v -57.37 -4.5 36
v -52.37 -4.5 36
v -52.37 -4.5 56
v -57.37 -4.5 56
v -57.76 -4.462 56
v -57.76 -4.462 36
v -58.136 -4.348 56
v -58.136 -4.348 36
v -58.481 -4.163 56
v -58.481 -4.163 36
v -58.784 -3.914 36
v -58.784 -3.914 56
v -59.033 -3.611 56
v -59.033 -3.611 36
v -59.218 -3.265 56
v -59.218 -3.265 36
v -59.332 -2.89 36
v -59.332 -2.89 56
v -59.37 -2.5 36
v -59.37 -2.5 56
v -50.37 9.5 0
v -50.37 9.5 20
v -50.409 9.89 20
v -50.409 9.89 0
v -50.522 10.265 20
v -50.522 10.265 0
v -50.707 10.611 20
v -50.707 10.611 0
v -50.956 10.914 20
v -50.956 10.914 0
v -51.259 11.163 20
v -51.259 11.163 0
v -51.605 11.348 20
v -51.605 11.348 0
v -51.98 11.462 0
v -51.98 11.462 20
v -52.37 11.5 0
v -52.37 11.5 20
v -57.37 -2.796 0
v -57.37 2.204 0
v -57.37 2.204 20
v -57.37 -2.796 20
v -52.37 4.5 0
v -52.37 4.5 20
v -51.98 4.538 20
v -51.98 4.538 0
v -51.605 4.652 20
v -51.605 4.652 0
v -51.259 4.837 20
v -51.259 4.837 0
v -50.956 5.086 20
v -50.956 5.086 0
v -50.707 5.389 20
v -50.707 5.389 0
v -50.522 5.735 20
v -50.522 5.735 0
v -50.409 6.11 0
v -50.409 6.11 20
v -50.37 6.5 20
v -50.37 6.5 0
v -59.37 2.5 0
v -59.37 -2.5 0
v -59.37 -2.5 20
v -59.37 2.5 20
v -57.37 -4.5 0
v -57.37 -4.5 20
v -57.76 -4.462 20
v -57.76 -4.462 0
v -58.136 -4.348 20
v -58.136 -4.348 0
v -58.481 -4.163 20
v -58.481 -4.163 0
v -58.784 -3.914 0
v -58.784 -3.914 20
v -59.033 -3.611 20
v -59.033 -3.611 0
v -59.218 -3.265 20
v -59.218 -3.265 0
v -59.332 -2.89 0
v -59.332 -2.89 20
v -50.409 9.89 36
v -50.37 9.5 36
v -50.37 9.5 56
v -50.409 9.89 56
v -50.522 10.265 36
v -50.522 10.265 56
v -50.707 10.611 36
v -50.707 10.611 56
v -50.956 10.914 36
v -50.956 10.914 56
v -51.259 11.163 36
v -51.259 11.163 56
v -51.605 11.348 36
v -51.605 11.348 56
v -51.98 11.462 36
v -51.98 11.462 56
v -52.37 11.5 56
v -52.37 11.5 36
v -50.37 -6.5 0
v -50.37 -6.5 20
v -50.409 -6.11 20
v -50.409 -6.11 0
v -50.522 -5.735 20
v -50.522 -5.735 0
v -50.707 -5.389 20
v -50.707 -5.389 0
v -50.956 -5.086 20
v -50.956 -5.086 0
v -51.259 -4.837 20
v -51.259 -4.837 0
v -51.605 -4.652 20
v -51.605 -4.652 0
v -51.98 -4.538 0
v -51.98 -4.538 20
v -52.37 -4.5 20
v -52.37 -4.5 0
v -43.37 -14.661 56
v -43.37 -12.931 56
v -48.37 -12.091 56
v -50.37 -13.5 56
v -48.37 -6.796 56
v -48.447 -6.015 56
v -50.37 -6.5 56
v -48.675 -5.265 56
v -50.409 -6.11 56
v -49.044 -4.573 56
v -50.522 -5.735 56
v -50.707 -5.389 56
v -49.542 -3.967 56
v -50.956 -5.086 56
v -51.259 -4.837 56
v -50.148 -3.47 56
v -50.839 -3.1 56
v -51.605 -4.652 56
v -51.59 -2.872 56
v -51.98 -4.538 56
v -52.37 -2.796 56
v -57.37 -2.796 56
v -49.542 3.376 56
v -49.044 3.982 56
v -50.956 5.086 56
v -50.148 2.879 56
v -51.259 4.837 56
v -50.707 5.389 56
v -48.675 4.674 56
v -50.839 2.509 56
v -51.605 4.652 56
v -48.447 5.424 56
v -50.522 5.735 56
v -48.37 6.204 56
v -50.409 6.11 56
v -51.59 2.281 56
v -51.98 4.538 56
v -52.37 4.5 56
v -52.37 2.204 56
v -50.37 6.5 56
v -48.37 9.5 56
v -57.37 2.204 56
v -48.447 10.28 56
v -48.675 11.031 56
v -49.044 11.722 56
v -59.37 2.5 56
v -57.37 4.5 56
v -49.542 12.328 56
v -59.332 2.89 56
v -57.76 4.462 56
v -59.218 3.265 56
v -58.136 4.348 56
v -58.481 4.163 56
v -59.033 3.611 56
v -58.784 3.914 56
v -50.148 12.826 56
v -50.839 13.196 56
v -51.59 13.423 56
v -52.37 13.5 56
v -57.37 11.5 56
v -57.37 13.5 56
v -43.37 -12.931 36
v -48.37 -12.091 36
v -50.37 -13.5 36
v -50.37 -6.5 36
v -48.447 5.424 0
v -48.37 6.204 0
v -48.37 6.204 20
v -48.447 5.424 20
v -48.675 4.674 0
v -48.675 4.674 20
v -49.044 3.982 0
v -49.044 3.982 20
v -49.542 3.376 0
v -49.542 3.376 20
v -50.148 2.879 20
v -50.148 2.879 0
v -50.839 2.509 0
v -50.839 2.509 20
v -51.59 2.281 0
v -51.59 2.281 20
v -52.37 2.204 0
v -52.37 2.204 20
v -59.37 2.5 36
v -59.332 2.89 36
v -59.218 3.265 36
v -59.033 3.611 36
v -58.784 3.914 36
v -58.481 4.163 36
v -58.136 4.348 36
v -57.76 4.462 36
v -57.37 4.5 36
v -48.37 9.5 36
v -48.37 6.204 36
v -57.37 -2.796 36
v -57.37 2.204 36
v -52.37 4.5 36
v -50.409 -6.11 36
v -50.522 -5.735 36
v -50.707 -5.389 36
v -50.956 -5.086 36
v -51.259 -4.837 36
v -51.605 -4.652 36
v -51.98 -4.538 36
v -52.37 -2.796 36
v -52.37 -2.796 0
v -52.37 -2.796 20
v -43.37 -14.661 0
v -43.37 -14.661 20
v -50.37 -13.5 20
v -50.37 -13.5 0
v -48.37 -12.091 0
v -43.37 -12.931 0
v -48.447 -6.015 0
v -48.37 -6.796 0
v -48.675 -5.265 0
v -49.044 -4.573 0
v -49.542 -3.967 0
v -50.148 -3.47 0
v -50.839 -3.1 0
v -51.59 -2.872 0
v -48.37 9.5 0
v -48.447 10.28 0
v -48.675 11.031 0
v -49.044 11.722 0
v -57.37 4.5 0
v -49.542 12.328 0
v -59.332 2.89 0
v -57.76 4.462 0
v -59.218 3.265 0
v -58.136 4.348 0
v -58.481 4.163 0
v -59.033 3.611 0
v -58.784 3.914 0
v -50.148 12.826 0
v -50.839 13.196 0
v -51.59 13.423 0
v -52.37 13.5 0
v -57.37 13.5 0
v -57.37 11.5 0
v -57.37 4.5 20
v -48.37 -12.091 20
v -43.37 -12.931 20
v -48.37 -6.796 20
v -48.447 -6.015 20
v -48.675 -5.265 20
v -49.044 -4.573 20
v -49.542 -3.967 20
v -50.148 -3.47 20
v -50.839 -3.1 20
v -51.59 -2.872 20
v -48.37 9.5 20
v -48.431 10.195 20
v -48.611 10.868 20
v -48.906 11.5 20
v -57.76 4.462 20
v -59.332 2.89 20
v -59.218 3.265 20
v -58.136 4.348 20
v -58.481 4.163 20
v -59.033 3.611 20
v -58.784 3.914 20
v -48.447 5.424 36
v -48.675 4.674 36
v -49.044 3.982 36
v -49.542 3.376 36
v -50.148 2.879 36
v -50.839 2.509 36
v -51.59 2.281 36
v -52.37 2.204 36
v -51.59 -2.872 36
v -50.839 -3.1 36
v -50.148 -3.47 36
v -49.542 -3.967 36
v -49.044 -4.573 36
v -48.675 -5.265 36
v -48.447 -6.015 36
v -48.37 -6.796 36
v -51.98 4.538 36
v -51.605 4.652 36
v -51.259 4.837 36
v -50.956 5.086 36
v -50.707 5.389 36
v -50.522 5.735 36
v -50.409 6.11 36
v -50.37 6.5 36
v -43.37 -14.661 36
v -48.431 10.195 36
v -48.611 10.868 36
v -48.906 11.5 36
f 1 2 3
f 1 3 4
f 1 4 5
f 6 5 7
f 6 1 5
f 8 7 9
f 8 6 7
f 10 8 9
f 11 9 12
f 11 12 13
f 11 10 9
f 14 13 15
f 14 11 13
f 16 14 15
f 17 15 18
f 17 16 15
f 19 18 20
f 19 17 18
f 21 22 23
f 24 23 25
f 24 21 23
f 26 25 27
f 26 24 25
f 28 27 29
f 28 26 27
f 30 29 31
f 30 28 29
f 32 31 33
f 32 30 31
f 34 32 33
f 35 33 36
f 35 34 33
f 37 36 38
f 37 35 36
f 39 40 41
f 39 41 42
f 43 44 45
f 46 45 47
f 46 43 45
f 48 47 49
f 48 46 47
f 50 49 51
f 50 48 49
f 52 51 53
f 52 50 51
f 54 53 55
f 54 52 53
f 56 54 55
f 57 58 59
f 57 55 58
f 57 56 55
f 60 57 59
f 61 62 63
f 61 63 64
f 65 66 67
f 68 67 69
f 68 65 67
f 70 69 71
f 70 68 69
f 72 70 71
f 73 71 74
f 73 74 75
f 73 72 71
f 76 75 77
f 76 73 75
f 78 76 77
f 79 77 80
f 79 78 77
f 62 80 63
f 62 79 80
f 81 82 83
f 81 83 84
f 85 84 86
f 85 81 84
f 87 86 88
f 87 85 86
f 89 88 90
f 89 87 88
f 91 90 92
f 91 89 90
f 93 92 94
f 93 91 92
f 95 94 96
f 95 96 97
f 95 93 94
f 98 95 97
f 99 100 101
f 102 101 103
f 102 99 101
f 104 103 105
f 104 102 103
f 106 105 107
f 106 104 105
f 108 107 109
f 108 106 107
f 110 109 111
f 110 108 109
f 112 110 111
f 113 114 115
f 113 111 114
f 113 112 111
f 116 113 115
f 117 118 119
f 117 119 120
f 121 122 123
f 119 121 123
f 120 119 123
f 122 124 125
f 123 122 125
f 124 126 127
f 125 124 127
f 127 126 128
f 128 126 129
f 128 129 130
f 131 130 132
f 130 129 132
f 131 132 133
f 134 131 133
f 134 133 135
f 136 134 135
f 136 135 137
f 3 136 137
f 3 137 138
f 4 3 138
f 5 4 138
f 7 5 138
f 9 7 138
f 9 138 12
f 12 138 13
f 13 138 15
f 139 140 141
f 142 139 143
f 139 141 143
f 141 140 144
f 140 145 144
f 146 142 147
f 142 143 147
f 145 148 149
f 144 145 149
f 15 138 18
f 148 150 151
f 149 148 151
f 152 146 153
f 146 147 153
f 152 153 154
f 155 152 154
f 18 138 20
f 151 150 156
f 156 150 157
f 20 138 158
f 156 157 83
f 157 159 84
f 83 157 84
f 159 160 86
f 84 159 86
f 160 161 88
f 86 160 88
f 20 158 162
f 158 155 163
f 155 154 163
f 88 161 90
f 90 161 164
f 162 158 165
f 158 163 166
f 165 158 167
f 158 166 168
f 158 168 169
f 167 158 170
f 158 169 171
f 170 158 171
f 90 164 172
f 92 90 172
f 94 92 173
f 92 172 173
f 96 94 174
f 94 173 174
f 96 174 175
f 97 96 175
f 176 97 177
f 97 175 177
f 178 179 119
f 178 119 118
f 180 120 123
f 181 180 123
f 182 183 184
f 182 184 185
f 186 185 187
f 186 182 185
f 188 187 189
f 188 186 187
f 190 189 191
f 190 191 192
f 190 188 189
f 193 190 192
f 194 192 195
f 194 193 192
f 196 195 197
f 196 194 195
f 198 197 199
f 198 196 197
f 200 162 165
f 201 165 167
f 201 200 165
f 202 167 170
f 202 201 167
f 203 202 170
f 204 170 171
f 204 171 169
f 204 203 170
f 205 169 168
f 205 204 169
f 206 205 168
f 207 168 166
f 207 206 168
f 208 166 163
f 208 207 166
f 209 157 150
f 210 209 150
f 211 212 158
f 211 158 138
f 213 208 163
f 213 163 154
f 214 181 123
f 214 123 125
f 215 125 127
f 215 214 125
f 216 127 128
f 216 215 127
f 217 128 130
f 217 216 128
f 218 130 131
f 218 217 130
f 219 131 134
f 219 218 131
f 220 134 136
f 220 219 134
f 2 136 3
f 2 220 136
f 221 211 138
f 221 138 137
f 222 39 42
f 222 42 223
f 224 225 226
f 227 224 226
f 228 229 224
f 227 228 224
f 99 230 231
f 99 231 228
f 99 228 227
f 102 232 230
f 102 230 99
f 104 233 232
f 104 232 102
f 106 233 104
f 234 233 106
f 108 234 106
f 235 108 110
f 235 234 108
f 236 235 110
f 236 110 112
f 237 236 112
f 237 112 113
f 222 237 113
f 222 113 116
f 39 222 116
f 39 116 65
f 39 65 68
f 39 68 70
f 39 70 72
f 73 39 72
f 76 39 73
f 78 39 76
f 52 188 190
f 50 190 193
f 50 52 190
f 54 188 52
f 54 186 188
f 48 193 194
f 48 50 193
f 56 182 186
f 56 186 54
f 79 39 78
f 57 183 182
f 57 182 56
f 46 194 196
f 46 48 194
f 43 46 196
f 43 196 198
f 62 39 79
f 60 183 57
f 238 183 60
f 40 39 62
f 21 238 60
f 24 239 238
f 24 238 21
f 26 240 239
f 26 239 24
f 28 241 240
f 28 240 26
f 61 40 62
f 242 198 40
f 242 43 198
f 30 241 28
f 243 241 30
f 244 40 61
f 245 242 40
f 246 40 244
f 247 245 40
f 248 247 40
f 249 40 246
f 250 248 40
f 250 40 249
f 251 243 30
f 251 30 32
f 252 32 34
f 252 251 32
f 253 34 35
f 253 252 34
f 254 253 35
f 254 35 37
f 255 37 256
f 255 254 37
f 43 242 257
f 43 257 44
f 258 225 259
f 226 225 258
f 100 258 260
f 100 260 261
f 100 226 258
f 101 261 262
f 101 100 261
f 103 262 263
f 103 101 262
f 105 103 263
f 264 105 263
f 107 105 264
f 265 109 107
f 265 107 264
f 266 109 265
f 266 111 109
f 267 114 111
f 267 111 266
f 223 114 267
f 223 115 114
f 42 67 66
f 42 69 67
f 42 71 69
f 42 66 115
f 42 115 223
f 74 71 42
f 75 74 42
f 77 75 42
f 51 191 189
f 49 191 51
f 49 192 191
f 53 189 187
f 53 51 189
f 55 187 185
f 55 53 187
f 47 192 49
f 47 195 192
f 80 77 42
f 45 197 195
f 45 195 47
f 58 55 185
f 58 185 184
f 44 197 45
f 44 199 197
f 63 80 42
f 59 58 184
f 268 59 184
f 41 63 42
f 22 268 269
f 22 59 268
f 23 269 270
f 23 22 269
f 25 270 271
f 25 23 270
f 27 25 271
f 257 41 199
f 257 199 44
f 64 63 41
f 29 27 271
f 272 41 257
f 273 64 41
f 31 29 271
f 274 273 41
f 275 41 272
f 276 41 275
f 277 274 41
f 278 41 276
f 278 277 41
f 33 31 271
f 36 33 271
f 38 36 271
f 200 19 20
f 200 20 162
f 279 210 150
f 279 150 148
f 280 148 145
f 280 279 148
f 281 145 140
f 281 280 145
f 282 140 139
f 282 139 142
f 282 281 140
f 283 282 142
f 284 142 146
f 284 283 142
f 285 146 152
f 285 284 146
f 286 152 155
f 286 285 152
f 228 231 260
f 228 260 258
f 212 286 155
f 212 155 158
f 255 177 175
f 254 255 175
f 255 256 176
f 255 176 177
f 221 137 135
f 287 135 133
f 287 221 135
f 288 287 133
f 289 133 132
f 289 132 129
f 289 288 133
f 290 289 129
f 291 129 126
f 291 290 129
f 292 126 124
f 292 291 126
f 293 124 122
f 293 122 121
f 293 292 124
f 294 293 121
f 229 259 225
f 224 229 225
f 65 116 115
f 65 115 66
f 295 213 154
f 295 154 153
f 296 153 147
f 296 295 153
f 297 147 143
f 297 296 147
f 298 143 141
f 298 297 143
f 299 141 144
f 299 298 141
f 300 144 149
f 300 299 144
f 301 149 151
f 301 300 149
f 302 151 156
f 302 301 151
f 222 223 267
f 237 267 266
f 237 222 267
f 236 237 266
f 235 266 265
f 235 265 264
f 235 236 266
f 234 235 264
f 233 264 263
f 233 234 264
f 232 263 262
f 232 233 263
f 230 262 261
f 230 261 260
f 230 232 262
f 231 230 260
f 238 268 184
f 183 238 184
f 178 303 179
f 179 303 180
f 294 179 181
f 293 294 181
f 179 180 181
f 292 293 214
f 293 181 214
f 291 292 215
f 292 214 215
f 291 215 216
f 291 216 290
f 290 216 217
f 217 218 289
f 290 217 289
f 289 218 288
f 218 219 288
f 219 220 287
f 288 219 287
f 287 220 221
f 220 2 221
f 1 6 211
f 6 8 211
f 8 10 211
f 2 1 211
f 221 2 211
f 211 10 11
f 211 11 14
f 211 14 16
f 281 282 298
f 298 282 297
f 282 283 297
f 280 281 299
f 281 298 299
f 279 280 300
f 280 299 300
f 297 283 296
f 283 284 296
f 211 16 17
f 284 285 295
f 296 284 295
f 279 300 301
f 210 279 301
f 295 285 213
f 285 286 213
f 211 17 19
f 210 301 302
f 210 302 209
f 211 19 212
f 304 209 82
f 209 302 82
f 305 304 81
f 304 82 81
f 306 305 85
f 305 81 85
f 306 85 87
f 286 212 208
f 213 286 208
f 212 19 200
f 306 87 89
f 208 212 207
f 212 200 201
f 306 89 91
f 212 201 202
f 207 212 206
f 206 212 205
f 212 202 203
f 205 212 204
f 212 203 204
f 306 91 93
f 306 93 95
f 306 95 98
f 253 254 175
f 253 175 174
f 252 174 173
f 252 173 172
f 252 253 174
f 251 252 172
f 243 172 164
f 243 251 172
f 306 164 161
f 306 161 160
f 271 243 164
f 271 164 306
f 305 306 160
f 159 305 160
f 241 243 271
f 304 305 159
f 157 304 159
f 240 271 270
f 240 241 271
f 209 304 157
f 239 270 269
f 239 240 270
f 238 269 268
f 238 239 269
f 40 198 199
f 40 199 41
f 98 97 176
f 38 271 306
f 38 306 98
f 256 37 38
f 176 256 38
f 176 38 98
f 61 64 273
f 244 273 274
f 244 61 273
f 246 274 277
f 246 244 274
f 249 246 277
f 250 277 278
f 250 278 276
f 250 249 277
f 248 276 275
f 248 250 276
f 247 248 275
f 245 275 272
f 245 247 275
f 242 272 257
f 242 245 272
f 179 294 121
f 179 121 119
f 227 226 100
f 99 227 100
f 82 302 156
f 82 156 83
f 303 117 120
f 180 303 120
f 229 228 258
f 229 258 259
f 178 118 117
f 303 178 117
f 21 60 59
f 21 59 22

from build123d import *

# Parameters (mm, degrees)
BOSS_EXTRUDE1_DEPTH = 56
SKETCH3_W           = 16
SKETCH3_H           = 28
CUT_EXTRUDE1_DEPTH  = 61.057795506


with BuildPart() as part:
    # Sketch2 → Boss-Extrude1 (new body)
    with BuildSketch(Plane.XY):
        with BuildLine():
            ThreePointArc((-52.370168415, 4.5), (-50.955954852, 5.085786438), (-50.370168415, 6.5))
            Line((-50.370168415, 6.5), (-50.370168415, 9.5))
            ThreePointArc((-50.370168415, 9.5), (-50.955954852, 10.914213562), (-52.370168415, 11.5))
            Line((-52.370168415, 11.5), (-57.370168415, 11.5))
            Line((-57.370168415, 11.5), (-57.370168415, 13.5))
            Line((-57.370168415, 13.5), (-52.370168415, 13.5))
            ThreePointArc((-52.370168415, 13.5), (-49.54174129, 12.328427125), (-48.370168415, 9.5))
            Line((-48.370168415, 9.5), (-48.370168415, 6.204424851))
            ThreePointArc((-48.370168415, 6.204424851), (-49.54174129, 3.375997726), (-52.370168415, 2.204424851))
            Line((-52.370168415, 2.204424851), (-57.370168415, 2.204424851))
            Line((-57.370168415, 2.204424851), (-57.370168415, -2.795575149))
            Line((-57.370168415, -2.795575149), (-52.370168415, -2.795575149))
            ThreePointArc((-52.370168415, -2.795575149), (-49.54174129, -3.967148025), (-48.370168415, -6.795575149))
            Line((-48.370168415, -6.795575149), (-48.370168415, -12.091150299))
            Line((-48.370168415, -12.091150299), (-43.370168415, -12.93073765))
            Line((-43.370168415, -12.93073765), (-43.370168415, -14.660791284))
            Line((-43.370168415, -14.660791284), (-50.370168415, -13.5))
            Line((-50.370168415, -13.5), (-50.370168415, -6.5))
            ThreePointArc((-50.370168415, -6.5), (-50.955954852, -5.085786438), (-52.370168415, -4.5))
            Line((-52.370168415, -4.5), (-57.370168415, -4.5))
            ThreePointArc((-57.370168415, -4.5), (-58.784381977, -3.914213562), (-59.370168415, -2.5))
            Line((-59.370168415, -2.5), (-59.370168415, 2.5))
            ThreePointArc((-59.370168415, 2.5), (-58.784381977, 3.914213562), (-57.370168415, 4.5))
            Line((-57.370168415, 4.5), (-52.370168415, 4.5))
        make_face()
    extrude(amount=BOSS_EXTRUDE1_DEPTH)

    # Sketch3 → Cut-Extrude1 (cut, through all)
    with BuildSketch(Plane.ZY.offset(59.370168415)):
        with Locations((28, -2.5)):
            Rectangle(SKETCH3_W, SKETCH3_H)
    extrude(amount=-CUT_EXTRUDE1_DEPTH, mode=Mode.SUBTRACT)


solid = part.part
